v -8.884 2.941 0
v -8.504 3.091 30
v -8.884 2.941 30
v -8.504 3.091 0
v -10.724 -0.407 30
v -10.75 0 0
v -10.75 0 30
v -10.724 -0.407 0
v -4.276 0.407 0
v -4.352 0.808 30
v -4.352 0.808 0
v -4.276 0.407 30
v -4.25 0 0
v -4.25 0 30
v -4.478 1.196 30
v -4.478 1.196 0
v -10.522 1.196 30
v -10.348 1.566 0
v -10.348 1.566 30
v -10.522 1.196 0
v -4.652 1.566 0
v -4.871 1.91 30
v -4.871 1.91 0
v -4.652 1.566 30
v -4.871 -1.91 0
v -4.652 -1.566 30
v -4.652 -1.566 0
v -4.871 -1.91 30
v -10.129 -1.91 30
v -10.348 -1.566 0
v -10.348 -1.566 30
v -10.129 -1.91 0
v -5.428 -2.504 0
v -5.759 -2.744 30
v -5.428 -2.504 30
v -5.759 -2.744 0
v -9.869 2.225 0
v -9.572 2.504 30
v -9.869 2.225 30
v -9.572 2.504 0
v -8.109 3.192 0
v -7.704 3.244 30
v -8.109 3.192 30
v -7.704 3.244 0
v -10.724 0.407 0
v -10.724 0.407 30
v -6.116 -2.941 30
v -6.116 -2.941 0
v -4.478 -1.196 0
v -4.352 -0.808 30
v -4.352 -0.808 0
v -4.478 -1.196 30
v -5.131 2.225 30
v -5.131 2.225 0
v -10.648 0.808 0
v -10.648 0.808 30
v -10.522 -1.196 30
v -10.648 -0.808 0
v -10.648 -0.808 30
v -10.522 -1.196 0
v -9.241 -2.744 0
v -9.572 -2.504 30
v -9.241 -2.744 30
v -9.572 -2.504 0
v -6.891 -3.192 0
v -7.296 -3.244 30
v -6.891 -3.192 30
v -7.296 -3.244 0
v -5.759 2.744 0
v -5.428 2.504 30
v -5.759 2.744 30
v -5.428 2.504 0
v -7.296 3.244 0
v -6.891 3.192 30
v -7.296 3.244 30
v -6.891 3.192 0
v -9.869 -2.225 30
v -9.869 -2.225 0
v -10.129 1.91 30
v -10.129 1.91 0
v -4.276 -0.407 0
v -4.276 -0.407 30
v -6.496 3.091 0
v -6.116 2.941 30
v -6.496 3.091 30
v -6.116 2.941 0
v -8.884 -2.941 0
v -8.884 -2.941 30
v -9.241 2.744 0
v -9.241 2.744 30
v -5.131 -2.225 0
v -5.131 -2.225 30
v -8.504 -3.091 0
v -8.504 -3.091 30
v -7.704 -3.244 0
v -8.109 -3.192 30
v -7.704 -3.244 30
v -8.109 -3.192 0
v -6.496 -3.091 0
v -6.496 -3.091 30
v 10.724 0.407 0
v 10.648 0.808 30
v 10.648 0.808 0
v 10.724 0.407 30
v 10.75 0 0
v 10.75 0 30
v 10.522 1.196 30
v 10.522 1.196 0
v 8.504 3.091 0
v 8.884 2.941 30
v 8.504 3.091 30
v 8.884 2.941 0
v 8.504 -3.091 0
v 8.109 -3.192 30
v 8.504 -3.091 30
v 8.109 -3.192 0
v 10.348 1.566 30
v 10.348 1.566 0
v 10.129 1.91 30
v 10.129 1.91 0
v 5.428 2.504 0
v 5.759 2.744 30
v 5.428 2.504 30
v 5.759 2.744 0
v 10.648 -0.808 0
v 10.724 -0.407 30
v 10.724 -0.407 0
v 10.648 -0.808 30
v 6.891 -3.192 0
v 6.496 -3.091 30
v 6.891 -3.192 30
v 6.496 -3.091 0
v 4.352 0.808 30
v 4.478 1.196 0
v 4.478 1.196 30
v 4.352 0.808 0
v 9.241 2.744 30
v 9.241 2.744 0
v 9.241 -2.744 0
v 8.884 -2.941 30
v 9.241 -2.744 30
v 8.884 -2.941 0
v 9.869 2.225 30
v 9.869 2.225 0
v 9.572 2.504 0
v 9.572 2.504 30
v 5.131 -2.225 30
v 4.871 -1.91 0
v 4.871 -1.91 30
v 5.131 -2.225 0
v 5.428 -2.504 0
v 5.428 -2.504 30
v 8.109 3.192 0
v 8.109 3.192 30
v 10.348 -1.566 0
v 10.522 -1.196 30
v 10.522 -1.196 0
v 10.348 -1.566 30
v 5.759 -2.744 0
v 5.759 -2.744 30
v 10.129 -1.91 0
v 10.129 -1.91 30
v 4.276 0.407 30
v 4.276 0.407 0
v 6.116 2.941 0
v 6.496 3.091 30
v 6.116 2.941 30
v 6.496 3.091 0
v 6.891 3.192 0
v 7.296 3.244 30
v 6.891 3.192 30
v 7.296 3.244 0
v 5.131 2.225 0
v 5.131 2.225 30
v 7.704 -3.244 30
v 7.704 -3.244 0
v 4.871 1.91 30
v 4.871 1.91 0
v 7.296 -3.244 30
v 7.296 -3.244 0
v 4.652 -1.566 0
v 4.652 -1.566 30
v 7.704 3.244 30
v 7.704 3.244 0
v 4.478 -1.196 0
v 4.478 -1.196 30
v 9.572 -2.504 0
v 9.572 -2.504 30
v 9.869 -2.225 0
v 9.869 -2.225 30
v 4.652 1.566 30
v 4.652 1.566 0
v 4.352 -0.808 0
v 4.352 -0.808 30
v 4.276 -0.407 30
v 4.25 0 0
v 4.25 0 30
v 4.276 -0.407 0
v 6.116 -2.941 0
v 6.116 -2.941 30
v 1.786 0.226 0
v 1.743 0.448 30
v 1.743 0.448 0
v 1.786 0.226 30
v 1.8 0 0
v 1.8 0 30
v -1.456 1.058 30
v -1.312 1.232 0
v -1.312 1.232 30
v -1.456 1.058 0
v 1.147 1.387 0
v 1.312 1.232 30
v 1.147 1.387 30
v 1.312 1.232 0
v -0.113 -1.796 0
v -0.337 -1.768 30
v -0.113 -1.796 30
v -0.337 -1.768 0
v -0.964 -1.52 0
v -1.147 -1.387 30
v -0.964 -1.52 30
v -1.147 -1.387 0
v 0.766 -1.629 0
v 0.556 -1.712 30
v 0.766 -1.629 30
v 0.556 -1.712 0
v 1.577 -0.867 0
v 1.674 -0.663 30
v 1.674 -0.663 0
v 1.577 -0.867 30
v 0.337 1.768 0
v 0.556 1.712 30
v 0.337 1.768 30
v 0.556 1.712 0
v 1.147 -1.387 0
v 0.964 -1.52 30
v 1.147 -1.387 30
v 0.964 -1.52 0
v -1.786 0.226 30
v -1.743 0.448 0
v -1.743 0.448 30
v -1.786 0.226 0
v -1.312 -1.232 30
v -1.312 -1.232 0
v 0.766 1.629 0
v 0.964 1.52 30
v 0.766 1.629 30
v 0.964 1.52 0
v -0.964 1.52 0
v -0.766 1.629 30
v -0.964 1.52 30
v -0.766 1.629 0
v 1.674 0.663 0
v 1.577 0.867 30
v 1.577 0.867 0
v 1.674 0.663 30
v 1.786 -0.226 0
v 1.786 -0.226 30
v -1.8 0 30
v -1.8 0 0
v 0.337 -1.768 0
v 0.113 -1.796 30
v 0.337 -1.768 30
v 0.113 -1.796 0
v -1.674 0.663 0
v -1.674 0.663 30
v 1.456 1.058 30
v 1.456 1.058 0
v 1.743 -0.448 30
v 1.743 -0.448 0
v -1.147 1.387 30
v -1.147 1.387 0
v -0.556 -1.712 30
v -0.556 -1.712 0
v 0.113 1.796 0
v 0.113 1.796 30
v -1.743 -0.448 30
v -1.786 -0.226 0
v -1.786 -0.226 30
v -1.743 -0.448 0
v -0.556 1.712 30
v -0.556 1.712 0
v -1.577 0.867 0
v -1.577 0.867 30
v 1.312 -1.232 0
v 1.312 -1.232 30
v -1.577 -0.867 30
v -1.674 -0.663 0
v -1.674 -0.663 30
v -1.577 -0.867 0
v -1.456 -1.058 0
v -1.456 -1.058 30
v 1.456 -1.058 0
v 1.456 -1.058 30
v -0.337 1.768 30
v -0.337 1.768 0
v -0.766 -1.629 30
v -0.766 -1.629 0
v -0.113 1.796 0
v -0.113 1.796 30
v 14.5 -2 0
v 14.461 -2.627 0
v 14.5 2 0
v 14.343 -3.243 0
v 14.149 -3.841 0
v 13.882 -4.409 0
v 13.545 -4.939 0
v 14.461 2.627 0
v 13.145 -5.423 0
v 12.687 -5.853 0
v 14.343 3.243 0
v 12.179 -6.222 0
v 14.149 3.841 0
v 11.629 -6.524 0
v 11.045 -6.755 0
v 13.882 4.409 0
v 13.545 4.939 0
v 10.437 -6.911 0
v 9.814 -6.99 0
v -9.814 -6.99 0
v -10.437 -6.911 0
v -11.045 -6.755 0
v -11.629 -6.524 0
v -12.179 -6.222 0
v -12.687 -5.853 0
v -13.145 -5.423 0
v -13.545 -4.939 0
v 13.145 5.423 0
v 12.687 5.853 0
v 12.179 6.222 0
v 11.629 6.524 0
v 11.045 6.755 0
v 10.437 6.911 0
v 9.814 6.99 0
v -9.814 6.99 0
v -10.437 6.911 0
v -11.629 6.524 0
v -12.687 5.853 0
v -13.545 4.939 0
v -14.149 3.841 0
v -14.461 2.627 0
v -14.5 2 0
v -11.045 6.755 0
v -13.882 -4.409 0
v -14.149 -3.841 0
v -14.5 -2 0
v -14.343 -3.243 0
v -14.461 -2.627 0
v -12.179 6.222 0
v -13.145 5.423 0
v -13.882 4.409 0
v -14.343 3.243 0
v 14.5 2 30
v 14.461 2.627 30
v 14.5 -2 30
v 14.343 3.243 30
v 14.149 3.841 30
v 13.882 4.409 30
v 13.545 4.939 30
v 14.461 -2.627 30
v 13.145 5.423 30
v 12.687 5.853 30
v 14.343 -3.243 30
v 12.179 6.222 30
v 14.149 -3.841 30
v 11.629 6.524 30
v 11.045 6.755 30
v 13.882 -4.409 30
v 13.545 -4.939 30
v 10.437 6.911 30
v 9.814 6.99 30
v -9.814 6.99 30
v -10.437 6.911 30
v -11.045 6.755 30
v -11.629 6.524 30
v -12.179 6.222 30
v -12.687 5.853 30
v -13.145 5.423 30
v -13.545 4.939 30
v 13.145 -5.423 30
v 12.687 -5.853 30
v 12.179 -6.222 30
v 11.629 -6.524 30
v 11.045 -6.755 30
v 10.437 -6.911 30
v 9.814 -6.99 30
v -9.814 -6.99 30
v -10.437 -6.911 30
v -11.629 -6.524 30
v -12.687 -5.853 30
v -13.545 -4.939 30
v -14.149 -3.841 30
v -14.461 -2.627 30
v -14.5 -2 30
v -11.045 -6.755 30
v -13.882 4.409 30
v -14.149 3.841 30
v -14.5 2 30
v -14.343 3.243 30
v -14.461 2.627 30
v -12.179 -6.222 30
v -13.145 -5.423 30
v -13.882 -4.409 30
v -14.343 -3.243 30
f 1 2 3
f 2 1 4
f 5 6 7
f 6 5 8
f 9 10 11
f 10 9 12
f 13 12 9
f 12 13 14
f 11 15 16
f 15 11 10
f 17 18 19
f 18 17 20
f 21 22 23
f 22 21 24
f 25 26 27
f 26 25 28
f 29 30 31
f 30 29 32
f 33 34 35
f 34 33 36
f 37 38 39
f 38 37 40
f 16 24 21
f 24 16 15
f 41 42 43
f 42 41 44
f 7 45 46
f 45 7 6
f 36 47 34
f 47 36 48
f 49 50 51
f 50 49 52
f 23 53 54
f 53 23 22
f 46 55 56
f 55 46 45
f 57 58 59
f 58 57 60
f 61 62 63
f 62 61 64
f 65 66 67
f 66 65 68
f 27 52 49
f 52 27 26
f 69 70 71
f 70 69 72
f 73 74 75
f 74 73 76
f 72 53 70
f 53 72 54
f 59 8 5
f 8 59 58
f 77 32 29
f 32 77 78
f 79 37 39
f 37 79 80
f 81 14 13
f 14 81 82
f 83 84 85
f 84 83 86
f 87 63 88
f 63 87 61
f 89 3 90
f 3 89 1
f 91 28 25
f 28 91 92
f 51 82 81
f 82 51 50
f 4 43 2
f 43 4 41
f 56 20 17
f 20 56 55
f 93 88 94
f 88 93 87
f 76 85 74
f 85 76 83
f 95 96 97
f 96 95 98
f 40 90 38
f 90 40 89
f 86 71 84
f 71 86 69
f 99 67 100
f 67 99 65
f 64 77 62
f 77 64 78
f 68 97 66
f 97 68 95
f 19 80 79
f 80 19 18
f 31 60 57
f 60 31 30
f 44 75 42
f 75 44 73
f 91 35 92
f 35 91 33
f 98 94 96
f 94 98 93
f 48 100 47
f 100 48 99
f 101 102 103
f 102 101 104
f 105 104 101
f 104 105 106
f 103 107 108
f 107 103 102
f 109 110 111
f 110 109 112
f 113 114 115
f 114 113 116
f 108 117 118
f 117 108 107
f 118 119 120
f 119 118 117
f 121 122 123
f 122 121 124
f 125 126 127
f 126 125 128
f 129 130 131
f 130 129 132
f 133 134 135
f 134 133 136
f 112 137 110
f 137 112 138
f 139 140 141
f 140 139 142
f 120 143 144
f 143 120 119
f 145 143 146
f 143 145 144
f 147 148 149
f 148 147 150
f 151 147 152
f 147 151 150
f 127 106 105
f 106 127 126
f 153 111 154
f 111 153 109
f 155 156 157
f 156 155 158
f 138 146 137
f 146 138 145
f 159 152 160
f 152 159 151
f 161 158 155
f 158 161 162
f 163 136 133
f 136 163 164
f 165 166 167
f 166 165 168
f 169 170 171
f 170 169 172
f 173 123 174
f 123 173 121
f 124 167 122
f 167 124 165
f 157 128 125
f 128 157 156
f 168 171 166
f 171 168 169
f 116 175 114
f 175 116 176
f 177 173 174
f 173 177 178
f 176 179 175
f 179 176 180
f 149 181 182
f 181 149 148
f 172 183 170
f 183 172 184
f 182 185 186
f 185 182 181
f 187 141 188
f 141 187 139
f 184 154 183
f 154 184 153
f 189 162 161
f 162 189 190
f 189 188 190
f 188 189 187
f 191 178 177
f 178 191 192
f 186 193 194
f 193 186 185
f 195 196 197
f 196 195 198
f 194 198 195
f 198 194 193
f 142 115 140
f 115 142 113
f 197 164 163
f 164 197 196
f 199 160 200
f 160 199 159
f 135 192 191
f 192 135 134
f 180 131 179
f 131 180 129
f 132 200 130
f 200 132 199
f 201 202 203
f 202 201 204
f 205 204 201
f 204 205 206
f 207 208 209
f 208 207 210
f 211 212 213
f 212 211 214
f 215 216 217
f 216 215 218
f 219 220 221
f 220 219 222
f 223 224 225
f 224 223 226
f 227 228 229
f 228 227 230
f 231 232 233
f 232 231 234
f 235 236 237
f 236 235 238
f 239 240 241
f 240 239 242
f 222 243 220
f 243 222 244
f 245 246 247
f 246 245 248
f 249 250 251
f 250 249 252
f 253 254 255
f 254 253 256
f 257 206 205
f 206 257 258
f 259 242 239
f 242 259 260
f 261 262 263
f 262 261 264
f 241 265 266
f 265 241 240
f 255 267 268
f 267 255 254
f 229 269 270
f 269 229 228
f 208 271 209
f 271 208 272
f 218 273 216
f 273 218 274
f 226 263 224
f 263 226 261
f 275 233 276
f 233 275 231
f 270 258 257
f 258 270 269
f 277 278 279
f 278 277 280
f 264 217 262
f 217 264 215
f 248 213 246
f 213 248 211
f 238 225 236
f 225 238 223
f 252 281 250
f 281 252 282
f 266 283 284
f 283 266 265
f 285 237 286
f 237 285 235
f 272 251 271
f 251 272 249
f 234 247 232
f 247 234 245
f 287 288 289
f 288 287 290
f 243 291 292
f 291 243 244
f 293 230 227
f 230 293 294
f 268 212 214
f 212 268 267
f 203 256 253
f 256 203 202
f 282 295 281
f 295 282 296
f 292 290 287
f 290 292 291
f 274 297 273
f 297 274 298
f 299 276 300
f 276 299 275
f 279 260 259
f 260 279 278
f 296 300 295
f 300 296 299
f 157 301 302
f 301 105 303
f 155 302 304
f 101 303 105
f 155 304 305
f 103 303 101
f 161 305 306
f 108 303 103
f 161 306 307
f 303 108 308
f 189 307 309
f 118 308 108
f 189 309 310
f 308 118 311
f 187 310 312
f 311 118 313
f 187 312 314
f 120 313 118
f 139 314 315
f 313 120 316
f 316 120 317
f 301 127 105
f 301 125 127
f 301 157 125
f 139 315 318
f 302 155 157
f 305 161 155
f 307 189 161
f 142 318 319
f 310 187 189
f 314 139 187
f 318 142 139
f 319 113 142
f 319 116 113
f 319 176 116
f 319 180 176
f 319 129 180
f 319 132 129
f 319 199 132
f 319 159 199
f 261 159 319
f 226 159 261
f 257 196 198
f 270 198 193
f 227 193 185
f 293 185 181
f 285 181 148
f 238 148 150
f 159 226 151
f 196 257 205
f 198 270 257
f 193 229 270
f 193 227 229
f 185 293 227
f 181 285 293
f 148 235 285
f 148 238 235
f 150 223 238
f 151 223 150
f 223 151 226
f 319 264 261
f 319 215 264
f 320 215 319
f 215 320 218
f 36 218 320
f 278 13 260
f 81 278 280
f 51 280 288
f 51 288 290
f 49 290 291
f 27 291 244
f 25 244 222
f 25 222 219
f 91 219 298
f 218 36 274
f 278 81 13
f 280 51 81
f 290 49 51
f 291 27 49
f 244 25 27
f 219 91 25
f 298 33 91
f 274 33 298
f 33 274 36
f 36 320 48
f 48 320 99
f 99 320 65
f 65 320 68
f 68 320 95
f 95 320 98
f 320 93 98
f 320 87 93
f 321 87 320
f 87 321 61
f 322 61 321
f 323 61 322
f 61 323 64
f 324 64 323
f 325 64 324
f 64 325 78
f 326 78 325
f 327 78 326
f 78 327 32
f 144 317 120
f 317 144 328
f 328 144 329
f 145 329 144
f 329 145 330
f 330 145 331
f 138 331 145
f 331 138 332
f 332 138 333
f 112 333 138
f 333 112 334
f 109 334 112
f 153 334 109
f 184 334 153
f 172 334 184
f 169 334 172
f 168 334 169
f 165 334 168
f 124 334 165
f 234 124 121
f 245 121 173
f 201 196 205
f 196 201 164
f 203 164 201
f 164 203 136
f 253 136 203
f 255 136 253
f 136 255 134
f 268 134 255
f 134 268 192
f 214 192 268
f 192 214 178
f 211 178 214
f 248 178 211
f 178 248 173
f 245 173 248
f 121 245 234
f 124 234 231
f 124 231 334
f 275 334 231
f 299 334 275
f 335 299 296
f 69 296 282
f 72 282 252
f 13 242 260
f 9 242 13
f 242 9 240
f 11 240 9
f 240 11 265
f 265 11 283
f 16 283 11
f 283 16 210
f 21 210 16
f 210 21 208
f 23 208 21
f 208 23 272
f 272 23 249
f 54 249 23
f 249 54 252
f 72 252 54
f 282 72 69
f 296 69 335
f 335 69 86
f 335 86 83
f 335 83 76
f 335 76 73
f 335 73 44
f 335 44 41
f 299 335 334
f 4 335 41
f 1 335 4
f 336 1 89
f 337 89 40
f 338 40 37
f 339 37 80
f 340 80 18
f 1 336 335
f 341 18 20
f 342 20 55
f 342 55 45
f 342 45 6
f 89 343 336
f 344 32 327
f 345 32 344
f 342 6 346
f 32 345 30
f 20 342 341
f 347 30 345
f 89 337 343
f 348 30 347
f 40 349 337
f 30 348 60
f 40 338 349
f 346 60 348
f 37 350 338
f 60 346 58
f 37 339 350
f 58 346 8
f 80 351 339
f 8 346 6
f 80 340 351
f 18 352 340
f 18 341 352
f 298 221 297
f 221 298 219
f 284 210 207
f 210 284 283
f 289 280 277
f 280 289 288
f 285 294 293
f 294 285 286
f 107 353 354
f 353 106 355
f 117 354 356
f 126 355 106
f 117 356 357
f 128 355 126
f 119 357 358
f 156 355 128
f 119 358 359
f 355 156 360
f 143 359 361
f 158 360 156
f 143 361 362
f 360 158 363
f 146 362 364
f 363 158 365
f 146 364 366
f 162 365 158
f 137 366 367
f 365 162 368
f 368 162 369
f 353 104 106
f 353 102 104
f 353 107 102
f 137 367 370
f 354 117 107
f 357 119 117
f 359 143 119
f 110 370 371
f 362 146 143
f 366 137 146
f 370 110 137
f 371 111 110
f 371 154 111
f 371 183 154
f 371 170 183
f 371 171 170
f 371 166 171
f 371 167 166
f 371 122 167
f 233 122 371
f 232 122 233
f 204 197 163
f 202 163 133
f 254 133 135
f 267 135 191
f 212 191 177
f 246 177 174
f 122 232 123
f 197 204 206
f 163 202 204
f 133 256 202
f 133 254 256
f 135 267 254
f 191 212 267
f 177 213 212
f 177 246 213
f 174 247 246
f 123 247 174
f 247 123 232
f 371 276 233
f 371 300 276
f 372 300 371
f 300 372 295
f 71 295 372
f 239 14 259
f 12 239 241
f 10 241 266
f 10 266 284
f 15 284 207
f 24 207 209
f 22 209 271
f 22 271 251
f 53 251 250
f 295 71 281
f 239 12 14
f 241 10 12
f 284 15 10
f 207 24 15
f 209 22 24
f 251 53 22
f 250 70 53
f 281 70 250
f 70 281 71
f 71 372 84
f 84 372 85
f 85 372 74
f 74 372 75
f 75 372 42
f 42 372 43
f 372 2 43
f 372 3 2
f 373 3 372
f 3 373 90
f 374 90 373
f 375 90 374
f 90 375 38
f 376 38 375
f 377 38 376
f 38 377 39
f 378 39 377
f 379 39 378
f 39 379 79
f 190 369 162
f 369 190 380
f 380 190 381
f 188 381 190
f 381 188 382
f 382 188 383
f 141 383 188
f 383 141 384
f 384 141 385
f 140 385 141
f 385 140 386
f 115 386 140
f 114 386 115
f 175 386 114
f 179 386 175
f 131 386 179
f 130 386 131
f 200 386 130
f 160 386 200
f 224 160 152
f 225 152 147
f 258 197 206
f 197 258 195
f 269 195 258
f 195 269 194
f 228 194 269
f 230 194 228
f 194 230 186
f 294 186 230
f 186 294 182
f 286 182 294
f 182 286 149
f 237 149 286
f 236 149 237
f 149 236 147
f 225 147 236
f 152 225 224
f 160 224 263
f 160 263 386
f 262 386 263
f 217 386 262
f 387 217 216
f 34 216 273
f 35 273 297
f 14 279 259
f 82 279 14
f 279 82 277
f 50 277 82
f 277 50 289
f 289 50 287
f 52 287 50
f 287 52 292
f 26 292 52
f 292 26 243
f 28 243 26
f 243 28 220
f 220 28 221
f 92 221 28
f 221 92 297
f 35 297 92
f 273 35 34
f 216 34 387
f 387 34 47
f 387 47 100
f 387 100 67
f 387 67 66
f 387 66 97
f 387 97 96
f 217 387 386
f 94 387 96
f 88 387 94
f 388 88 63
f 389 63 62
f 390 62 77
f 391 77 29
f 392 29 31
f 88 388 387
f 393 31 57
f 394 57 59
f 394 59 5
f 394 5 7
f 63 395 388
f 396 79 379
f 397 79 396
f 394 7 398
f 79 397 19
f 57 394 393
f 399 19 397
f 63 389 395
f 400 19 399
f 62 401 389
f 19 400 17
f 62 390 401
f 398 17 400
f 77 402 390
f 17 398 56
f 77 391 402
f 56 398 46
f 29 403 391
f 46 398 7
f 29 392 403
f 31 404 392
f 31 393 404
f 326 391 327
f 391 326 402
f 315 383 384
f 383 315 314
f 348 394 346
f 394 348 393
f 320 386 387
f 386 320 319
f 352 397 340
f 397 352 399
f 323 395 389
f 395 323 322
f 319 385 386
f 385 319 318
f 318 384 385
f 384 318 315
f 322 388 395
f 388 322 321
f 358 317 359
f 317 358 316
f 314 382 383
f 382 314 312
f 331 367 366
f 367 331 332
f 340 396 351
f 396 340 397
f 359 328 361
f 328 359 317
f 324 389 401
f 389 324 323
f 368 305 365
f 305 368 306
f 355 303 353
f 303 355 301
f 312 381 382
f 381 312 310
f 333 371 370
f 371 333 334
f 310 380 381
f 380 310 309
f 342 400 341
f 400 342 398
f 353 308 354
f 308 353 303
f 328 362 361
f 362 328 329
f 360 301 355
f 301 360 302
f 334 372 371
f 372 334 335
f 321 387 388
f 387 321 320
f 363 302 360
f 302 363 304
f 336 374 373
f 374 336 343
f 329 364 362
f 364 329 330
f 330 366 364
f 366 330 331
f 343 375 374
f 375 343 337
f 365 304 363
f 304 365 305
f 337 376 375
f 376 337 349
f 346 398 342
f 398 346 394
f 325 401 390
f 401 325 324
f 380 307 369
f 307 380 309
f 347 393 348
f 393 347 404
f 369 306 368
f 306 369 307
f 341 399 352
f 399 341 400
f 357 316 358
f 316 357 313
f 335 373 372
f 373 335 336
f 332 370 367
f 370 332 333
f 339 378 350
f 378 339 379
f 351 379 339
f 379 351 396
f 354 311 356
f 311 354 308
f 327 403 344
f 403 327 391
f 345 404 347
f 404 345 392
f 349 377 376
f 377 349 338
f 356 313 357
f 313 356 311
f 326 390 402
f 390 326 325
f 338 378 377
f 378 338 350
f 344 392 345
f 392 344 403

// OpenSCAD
$fn = 50;


difference() {
	union() {
		hull() {
			translate(v = [-9.5000000000, 2.0000000000, 0]) {
				cylinder(h = 30, r = 5);
			}
			translate(v = [9.5000000000, 2.0000000000, 0]) {
				cylinder(h = 30, r = 5);
			}
			translate(v = [-9.5000000000, -2.0000000000, 0]) {
				cylinder(h = 30, r = 5);
			}
			translate(v = [9.5000000000, -2.0000000000, 0]) {
				cylinder(h = 30, r = 5);
			}
		}
	}
	union() {
		translate(v = [-7.5000000000, 0.0000000000, -100.0000000000]) {
			cylinder(h = 200, r = 3.2500000000);
		}
		translate(v = [7.5000000000, 0.0000000000, -100.0000000000]) {
			cylinder(h = 200, r = 3.2500000000);
		}
		translate(v = [-7.5000000000, 0.0000000000, 0]) {
			cylinder(h = 30, r = 1.8000000000);
		}
		cylinder(h = 30, r = 1.8000000000);
		translate(v = [7.5000000000, 0.0000000000, 0]) {
			cylinder(h = 30, r = 1.8000000000);
		}
		translate(v = [-7.5000000000, 0.0000000000, 0]) {
			cylinder(h = 30, r = 1.8000000000);
		}
		cylinder(h = 30, r = 1.8000000000);
		translate(v = [7.5000000000, 0.0000000000, 0]) {
			cylinder(h = 30, r = 1.8000000000);
		}
		translate(v = [-7.5000000000, 0.0000000000, 0]) {
			cylinder(h = 30, r = 1.8000000000);
		}
		cylinder(h = 30, r = 1.8000000000);
		translate(v = [7.5000000000, 0.0000000000, 0]) {
			cylinder(h = 30, r = 1.8000000000);
		}
	}
}
